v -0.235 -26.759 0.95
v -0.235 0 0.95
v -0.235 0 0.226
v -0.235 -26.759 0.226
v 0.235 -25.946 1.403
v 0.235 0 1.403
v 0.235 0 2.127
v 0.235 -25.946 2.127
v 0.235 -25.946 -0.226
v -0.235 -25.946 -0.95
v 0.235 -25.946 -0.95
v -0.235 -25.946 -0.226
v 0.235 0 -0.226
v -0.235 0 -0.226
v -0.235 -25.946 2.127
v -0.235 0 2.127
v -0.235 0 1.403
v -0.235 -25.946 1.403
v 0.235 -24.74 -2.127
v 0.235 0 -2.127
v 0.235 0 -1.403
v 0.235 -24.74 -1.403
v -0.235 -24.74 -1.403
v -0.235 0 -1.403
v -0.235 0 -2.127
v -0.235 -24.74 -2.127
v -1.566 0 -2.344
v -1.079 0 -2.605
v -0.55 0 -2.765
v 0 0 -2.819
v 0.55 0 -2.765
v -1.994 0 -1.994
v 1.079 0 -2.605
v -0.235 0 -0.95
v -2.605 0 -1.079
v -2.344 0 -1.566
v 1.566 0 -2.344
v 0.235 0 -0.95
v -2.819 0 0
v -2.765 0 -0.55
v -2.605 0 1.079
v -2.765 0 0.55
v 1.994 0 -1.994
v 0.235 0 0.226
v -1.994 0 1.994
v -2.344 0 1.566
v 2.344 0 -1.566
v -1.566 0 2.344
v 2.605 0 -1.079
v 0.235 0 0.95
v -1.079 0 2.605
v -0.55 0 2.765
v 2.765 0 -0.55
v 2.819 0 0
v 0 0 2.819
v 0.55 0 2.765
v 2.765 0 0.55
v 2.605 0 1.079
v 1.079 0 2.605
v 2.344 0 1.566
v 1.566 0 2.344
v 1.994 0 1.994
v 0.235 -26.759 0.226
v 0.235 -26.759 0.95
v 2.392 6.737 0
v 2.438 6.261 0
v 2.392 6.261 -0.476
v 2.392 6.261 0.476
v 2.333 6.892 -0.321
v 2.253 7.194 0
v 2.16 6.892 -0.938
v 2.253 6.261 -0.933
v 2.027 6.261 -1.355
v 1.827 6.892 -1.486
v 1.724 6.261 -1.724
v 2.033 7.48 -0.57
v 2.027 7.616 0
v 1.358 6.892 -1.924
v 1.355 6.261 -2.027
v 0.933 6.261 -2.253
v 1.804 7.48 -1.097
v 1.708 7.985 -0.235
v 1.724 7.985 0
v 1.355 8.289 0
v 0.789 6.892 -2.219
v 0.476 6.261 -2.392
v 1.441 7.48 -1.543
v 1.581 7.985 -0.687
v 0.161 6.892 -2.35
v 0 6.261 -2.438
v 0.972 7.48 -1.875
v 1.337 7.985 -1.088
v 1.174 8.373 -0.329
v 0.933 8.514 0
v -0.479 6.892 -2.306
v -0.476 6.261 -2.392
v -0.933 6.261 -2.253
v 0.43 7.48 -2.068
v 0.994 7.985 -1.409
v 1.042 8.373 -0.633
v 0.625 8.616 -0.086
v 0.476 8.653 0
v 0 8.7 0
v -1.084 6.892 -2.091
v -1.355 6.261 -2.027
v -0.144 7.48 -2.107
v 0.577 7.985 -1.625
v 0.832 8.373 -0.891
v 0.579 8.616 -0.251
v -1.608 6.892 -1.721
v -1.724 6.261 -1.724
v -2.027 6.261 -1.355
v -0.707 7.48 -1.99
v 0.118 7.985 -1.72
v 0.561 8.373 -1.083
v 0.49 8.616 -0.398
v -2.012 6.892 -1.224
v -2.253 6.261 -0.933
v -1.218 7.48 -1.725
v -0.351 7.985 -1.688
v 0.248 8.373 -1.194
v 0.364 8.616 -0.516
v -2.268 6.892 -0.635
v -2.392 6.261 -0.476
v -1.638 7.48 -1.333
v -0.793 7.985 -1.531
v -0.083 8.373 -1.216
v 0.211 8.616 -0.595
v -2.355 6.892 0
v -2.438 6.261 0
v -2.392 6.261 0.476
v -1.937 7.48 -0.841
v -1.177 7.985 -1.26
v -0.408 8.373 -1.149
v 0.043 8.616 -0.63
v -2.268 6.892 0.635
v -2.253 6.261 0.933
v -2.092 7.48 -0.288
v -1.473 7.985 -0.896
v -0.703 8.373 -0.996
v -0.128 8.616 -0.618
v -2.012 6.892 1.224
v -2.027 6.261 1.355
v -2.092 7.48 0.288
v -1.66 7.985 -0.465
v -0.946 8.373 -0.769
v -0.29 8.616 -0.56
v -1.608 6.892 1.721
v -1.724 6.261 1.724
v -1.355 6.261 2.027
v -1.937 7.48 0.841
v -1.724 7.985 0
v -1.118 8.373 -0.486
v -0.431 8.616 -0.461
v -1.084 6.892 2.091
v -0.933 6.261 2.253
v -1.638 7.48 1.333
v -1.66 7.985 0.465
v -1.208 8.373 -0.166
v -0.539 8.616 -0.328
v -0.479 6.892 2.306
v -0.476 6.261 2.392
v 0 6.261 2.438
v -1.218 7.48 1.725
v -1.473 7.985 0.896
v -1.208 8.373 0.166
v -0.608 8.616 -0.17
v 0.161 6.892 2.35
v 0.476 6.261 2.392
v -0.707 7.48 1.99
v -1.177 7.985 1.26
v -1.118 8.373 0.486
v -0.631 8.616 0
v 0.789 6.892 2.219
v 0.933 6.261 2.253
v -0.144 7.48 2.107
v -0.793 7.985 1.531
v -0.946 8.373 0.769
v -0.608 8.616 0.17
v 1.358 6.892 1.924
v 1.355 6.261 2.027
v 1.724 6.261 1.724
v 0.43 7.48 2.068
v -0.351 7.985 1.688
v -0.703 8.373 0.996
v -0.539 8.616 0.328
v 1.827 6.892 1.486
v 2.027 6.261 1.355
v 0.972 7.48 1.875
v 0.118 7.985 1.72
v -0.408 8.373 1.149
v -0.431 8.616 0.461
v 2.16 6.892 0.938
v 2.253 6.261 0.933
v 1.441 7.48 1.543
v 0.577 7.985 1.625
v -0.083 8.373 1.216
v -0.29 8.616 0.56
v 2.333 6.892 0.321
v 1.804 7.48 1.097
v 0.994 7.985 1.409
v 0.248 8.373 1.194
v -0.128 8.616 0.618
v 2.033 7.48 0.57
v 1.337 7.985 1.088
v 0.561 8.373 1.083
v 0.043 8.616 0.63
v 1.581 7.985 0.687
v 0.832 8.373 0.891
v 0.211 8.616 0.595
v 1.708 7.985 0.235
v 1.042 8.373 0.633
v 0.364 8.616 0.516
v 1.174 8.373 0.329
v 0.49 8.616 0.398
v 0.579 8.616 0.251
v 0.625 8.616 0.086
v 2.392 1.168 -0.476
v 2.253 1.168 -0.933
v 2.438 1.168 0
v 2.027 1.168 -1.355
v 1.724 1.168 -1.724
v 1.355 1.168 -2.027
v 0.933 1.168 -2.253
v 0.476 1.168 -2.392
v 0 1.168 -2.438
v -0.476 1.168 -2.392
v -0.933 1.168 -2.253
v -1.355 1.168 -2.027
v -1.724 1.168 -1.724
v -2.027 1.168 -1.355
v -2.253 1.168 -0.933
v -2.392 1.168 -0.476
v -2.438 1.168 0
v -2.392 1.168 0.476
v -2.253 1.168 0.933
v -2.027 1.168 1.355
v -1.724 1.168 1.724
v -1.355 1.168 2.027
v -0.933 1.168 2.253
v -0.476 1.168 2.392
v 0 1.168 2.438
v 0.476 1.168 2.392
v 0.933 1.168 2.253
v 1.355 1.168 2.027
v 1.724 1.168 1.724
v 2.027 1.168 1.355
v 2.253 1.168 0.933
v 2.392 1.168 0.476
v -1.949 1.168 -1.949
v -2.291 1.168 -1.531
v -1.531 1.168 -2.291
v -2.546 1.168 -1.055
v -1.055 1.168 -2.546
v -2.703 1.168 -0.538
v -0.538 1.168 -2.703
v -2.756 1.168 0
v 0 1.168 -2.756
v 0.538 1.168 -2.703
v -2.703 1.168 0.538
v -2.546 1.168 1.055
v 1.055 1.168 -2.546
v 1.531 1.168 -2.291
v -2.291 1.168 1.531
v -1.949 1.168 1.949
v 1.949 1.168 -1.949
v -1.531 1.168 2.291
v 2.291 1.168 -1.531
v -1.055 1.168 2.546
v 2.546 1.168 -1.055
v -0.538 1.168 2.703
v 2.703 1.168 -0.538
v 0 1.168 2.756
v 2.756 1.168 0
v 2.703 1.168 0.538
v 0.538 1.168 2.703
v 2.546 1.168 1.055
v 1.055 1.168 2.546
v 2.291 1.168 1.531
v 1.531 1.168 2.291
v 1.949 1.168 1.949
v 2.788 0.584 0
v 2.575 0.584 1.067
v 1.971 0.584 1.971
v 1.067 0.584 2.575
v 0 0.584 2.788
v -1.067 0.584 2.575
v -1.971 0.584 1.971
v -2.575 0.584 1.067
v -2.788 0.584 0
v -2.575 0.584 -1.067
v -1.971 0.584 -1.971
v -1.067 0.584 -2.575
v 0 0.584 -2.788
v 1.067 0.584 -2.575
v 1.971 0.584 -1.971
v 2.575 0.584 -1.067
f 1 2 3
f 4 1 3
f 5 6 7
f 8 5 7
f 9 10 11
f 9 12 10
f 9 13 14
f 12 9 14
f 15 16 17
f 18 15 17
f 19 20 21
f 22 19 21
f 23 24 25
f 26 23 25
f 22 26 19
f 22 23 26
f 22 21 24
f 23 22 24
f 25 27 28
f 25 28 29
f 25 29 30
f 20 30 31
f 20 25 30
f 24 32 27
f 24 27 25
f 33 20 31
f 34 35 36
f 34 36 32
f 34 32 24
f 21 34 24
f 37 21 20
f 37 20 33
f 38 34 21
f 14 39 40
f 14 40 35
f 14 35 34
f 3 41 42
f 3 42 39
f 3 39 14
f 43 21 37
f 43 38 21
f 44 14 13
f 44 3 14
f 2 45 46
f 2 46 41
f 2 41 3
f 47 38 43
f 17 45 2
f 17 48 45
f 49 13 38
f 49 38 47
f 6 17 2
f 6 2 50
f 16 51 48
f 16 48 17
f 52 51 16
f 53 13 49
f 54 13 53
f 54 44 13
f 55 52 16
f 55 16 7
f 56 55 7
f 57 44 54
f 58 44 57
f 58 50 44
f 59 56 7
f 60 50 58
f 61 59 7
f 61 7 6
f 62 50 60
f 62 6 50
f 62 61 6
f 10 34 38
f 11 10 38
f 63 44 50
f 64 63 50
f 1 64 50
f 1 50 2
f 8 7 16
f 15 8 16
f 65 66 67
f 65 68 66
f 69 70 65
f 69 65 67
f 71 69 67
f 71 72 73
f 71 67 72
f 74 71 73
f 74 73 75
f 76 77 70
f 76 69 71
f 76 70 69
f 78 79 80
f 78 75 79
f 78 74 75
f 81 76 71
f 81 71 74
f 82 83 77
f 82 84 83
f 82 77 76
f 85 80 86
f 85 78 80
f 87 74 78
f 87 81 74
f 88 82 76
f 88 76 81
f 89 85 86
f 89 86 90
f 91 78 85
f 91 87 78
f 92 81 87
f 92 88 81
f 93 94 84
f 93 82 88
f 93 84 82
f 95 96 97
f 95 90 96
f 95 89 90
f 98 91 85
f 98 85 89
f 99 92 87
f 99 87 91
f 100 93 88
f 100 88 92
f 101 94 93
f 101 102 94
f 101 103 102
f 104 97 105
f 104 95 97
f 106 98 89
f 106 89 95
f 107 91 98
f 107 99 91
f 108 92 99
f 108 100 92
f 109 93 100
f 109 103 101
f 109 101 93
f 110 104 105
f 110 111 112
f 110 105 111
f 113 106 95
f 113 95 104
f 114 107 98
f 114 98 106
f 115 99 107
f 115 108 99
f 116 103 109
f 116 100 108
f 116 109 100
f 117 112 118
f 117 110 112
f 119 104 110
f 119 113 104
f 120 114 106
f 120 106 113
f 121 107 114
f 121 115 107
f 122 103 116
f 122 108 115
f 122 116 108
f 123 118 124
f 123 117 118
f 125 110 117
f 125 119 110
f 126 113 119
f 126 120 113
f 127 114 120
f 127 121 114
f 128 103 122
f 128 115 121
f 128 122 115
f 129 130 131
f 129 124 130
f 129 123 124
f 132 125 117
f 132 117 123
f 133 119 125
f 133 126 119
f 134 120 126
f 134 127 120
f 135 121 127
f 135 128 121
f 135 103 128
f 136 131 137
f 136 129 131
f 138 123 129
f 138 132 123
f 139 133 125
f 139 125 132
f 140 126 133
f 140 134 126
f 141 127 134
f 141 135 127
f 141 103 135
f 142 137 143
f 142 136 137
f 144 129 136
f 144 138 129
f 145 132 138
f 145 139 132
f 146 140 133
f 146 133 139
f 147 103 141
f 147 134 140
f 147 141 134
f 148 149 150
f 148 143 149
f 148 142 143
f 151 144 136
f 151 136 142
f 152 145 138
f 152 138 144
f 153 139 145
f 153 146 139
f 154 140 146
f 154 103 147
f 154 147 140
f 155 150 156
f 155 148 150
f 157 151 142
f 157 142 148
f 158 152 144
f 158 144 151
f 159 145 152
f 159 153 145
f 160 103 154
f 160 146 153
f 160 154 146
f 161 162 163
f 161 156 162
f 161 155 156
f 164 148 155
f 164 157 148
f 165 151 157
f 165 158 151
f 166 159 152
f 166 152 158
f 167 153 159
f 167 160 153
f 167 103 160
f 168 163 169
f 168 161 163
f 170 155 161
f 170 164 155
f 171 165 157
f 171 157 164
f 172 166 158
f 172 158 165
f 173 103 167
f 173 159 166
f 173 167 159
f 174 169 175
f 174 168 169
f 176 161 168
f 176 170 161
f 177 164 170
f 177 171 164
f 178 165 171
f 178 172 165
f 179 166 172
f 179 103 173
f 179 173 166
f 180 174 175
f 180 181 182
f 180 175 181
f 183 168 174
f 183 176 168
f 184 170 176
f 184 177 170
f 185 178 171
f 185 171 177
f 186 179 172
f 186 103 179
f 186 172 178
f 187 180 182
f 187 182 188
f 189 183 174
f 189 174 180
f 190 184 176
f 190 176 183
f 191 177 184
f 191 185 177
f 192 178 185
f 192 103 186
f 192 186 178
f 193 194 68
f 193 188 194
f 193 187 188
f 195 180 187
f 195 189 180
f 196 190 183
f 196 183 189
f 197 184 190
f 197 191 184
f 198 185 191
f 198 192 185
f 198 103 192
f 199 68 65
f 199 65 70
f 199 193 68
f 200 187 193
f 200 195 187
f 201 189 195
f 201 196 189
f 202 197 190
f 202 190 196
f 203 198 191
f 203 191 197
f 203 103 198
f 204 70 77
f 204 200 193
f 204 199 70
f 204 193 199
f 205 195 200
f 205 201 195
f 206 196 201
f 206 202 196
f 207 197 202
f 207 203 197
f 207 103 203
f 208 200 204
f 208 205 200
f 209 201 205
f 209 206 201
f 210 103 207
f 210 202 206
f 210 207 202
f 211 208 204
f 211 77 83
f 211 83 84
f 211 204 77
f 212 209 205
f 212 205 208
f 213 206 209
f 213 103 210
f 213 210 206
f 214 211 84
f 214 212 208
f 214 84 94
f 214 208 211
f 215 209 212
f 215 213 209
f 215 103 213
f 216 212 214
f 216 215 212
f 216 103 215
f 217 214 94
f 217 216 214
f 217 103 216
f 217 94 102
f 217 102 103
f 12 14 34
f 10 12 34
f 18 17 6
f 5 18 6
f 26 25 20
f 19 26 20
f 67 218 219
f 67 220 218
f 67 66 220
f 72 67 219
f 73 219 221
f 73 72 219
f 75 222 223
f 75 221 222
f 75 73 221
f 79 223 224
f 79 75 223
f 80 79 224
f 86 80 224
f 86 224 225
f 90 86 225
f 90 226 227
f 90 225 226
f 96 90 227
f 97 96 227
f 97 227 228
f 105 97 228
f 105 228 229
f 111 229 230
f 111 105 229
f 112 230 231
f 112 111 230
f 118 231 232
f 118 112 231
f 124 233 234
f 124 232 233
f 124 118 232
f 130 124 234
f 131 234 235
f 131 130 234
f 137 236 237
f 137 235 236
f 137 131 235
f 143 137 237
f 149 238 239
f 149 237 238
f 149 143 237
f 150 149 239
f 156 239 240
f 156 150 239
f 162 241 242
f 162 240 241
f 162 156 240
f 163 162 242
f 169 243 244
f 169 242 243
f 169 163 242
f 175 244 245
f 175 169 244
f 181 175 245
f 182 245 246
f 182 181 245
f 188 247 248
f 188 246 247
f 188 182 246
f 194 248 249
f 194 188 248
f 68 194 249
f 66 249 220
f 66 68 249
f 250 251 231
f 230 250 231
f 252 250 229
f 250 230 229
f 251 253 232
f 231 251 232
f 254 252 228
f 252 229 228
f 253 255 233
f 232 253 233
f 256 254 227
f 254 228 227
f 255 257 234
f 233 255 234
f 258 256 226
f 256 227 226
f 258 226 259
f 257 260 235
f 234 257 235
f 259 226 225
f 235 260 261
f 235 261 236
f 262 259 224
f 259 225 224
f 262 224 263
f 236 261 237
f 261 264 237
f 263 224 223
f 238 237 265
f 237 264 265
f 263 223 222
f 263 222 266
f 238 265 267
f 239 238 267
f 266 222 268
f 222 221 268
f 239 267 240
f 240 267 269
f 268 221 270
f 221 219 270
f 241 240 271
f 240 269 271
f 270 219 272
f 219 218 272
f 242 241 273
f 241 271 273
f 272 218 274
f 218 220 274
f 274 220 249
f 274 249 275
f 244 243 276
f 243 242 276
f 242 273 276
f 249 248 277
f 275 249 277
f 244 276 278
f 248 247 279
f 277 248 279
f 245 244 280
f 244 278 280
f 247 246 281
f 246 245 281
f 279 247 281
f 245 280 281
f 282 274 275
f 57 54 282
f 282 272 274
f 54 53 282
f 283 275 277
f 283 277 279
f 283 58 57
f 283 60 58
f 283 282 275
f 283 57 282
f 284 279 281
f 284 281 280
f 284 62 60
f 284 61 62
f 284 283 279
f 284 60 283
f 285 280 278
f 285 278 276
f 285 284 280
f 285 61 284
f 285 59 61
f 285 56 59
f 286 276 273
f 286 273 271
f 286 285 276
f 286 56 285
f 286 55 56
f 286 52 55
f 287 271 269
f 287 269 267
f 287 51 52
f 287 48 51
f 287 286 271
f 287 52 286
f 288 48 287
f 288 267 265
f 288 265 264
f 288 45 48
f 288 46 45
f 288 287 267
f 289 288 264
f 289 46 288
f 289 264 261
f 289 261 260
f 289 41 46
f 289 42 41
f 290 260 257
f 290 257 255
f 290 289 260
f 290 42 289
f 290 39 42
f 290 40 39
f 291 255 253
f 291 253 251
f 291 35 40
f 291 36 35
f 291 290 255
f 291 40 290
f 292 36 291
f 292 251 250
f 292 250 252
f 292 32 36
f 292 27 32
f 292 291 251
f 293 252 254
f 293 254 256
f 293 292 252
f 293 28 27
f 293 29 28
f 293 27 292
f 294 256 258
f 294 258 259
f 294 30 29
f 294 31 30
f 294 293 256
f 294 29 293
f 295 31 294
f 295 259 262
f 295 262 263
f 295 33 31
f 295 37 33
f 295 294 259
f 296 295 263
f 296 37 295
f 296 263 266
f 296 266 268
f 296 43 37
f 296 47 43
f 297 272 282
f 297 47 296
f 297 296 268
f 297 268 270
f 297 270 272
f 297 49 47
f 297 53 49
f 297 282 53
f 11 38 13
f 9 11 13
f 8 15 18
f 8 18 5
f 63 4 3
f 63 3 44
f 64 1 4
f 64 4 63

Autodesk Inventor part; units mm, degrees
ref_plane "YZ Plane" through (0, 0, 0) normal (1, 0, 0) x (0, 1, 0)
ref_plane "XZ Plane" through (0, 0, 0) normal (0, 1, 0) x (-1, 0, 0)
ref_plane "XY Plane" through (0, 0, 0) normal (0, 0, 1) x (1, 0, 0)
sketch "Sketch1" plane through (0, 0, 0) normal (0, 0, 1) x (1, 0, 0)
  line L0 (0, 8.6995) -> (0, 0)
  line L1 (0, 0) -> (2.8194, 0)
  line L2 (2.8194, 0) -> (2.7559, 1.1684)
  line L3 (2.7559, 1.1684) -> (2.4384, 1.1684)
  line L4 (2.4384, 1.1684) -> (2.4384, 6.2611)
  arc A0 (2.4384, 6.2611) -> (0, 8.6995) centre (0, 6.2611) ccw
  dimension "d0" = 2.4384
  dimension "d1" = 2.8194
  dimension "d2" = 2.7559
  dimension "d3" = 1.1684
  dimension "d4" = 8.6995
revolve "Revolution1" add sketch "Sketch1" angle 360 about axis through (0, 8.6995, 0) along (0, -1, 0)
sketch "Sketch2" plane through (0, 0, 0) normal (0, -1, 0) x (1, 0, 0)
  line L0 (0.235, 2.1273) -> (-0.2349, 2.1273)
  line L1 (-0.2349, 2.1273) -> (-0.2349, 1.4034)
  line L2 (-0.2349, 1.4034) -> (0.235, 1.4034)
  line L3 (0.235, 1.4034) -> (0.235, 2.1273)
  line L4 (0.235, 2.1273) -> (-0.2349, 1.4034) construction
  line L5 (-0.2349, 2.1273) -> (0.235, 1.4034) construction
  line L6 (0.235, 0.9504) -> (-0.2349, 0.9504)
  line L7 (-0.2349, 0.9504) -> (-0.2349, 0.2265)
  line L8 (-0.2349, 0.2265) -> (0.235, 0.2265)
  line L9 (0.235, 0.2265) -> (0.235, 0.9504)
  line L10 (0.235, 0.9504) -> (-0.2349, 0.2265) construction
  line L11 (-0.2349, 0.9504) -> (0.235, 0.2265) construction
  line L12 (0.235, -0.2265) -> (-0.2349, -0.2265)
  line L13 (-0.2349, -0.2265) -> (-0.2349, -0.9504)
  line L14 (-0.2349, -0.9504) -> (0.235, -0.9504)
  line L15 (0.235, -0.9504) -> (0.235, -0.2265)
  line L16 (0.235, -0.2265) -> (-0.2349, -0.9504) construction
  line L17 (-0.2349, -0.2265) -> (0.235, -0.9504) construction
  line L18 (0.2349, -1.4033) -> (-0.2349, -1.4033)
  line L19 (-0.2349, -1.4033) -> (-0.2349, -2.1273)
  line L20 (-0.2349, -2.1273) -> (0.2349, -2.1273)
  line L21 (0.2349, -2.1273) -> (0.2349, -1.4033)
  line L22 (0.2349, -1.4033) -> (-0.2349, -2.1273) construction
  line L23 (-0.2349, -1.4033) -> (0.2349, -2.1273) construction
  circle A0 centre (0, 0) radius 2.7559 construction
  line L24 (2.7559, 0) -> (-2.7559, 0) construction
  point P0 (0, 0)
  point P1 (0, 1.7653)
  point P2 (0, 0.5884)
  point P3 (0, -0.5884)
  point P4 (0, -1.7653)
  point P5 (0, -1.7653)
  point P6 (0, -0.9504)
  point P7 (0, -0.5884)
  point P8 (0, 0.5884)
  point P9 (0, 0.2265)
  point P10 (0, 1.7653)
  point P11 (0, -0.5884)
  dimension "d6" = 0.4699
  dimension "d7" = 0.7239
  dimension "d8" = 4.2545
  dimension "d9" = 0.453
  dimension "d10" = 0.453
extrude "Extrusion1" add sketch "Sketch2" along normal blind 24.7396
sketch "Sketch3" plane through (0, -24.7396, 0) normal (0, -1, 0) x (1, 0, 0)
  line L0 (0.235, 2.1273) -> (-0.2349, 2.1273) projected
  line L1 (-0.2349, 2.1273) -> (-0.2349, 1.4034) projected
  line L2 (-0.2349, 1.4034) -> (0.235, 1.4034) projected
  line L3 (0.235, 1.4034) -> (0.235, 2.1273) projected
  line L4 (0.235, -0.2265) -> (-0.2349, -0.2265) projected
  line L5 (-0.2349, -0.2265) -> (-0.2349, -0.9504) projected
  line L6 (-0.2349, -0.9504) -> (0.235, -0.9504) projected
  line L7 (0.235, -0.9504) -> (0.235, -0.2265) projected
  point P0 (0, 0)
extrude "Extrusion2" add sketch "Sketch3" along normal blind 1.2065
sketch "Sketch4" plane through (0, -24.7396, 0) normal (0, -1, 0) x (1, 0, 0)
  line L0 (0.235, 0.9504) -> (-0.2349, 0.9504) projected
  line L1 (-0.2349, 0.9504) -> (-0.2349, 0.2265) projected
  line L2 (-0.2349, 0.2265) -> (0.235, 0.2265) projected
  line L3 (0.235, 0.2265) -> (0.235, 0.9504) projected
  point P0 (0, 0)
extrude "Extrusion3" add sketch "Sketch4" along normal blind 2.0193
equation "\"d9\" = d10"
properties part number "Full LED"
